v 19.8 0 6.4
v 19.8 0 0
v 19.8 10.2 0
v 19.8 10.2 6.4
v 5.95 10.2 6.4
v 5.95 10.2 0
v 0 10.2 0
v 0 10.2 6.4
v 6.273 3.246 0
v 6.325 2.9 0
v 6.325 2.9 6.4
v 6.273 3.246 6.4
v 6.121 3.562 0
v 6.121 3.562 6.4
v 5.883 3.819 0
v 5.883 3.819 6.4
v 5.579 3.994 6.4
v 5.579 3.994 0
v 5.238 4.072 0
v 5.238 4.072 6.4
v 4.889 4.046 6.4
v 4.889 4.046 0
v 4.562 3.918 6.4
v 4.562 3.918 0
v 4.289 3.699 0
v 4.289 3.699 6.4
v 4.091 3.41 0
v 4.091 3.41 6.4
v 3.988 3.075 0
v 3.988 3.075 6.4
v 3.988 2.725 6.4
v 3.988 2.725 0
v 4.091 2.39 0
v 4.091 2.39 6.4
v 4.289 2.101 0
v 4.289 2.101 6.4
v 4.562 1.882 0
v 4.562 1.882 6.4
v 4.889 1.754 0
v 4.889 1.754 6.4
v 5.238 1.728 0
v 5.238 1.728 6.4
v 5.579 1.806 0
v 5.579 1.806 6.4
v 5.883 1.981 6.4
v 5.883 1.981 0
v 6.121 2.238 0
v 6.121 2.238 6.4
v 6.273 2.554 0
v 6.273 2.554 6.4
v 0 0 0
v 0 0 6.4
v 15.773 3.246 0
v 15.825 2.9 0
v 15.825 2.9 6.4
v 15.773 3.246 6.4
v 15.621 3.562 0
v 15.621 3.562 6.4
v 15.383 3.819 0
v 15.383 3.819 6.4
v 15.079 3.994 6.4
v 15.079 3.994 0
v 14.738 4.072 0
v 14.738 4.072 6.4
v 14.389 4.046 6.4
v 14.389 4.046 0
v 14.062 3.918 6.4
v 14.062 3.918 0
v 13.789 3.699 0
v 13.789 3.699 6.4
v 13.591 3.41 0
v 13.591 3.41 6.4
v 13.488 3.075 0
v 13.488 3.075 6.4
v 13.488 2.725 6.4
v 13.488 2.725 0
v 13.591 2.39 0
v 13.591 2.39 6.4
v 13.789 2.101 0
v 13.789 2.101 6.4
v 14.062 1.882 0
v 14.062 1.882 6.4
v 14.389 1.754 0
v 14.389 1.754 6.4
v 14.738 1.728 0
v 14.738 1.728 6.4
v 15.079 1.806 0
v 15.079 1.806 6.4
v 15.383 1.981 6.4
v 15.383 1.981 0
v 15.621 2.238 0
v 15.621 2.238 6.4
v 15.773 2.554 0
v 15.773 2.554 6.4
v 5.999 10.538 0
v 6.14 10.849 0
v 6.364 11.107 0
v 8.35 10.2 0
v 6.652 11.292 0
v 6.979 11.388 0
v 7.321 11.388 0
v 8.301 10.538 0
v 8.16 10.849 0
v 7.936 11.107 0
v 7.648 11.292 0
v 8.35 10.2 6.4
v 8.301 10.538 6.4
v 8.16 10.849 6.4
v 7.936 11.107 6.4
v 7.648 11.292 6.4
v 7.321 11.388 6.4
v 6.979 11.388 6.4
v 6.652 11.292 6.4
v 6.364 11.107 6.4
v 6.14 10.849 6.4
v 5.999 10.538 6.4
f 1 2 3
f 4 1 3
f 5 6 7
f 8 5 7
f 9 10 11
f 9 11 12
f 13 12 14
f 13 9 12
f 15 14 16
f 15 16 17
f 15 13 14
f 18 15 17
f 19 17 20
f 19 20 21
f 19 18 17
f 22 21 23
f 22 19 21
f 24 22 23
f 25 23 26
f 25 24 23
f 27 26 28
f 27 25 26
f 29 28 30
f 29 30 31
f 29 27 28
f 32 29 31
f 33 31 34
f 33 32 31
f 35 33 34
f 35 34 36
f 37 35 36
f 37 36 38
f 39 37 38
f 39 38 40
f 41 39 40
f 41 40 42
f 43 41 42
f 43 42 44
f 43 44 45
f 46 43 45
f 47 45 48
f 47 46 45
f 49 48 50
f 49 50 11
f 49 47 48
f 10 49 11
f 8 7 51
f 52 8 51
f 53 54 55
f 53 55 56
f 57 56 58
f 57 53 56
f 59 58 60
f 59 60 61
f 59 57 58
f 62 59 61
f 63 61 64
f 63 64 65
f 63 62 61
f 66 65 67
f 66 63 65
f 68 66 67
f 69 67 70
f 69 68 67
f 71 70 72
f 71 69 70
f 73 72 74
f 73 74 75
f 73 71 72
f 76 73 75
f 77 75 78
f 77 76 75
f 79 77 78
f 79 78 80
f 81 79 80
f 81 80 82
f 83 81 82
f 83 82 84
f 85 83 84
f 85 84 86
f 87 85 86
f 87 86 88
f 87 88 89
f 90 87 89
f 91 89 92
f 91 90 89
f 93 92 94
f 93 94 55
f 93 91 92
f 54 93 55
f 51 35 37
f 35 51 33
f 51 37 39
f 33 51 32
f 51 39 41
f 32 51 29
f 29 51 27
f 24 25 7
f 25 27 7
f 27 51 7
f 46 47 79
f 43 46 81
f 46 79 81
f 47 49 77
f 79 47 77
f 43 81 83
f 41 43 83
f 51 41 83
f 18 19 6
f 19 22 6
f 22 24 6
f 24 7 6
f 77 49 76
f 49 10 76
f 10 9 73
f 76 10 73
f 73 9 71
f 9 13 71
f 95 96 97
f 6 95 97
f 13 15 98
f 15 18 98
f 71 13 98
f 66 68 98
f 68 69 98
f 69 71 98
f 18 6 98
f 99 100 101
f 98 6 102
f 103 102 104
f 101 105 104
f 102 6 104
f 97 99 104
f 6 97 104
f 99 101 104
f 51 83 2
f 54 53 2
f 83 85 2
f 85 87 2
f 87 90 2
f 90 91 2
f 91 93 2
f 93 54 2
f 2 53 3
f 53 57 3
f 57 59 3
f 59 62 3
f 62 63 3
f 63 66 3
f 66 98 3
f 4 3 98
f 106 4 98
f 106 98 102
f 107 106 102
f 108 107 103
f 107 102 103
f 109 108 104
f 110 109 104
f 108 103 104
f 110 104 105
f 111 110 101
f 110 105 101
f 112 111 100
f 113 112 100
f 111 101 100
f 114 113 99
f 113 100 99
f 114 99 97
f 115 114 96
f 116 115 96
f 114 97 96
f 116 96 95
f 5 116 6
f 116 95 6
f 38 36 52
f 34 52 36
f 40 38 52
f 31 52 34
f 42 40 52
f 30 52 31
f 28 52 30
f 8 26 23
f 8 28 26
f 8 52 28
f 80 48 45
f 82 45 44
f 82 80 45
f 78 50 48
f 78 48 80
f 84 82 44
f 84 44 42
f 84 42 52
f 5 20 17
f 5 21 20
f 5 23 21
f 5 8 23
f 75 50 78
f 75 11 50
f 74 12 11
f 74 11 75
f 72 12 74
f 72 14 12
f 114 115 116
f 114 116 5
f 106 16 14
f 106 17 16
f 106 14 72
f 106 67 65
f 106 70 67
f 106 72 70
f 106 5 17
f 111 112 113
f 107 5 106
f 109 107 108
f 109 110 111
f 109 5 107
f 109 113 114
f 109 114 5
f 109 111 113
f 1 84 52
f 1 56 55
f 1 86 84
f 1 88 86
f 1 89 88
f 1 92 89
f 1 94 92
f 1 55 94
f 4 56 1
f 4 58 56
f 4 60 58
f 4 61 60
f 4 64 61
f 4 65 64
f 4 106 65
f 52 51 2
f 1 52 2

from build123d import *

# Parameters (mm, degrees)
SKETCH1_R           = 1.175
BOSS_EXTRUDE1_DEPTH = 6.4


with BuildPart() as part:
    # Sketch1 → Boss-Extrude1 (new body)
    with BuildSketch(Plane.XY):
        with BuildLine():
            Line((0, 0), (19.8, 0))
            Line((19.8, 0), (19.8, 10.2))
            Line((19.8, 10.2), (8.35, 10.2))
            ThreePointArc((8.35, 10.2), (7.15, 11.4), (5.95, 10.2))
            Line((5.95, 10.2), (0, 10.2))
            Line((0, 10.2), (0, 0))
        make_face()
        with Locations((14.65, 2.9)):
            Circle(SKETCH1_R, mode=Mode.SUBTRACT)
        with Locations((5.15, 2.9)):
            Circle(SKETCH1_R, mode=Mode.SUBTRACT)
    extrude(amount=BOSS_EXTRUDE1_DEPTH)


solid = part.part
